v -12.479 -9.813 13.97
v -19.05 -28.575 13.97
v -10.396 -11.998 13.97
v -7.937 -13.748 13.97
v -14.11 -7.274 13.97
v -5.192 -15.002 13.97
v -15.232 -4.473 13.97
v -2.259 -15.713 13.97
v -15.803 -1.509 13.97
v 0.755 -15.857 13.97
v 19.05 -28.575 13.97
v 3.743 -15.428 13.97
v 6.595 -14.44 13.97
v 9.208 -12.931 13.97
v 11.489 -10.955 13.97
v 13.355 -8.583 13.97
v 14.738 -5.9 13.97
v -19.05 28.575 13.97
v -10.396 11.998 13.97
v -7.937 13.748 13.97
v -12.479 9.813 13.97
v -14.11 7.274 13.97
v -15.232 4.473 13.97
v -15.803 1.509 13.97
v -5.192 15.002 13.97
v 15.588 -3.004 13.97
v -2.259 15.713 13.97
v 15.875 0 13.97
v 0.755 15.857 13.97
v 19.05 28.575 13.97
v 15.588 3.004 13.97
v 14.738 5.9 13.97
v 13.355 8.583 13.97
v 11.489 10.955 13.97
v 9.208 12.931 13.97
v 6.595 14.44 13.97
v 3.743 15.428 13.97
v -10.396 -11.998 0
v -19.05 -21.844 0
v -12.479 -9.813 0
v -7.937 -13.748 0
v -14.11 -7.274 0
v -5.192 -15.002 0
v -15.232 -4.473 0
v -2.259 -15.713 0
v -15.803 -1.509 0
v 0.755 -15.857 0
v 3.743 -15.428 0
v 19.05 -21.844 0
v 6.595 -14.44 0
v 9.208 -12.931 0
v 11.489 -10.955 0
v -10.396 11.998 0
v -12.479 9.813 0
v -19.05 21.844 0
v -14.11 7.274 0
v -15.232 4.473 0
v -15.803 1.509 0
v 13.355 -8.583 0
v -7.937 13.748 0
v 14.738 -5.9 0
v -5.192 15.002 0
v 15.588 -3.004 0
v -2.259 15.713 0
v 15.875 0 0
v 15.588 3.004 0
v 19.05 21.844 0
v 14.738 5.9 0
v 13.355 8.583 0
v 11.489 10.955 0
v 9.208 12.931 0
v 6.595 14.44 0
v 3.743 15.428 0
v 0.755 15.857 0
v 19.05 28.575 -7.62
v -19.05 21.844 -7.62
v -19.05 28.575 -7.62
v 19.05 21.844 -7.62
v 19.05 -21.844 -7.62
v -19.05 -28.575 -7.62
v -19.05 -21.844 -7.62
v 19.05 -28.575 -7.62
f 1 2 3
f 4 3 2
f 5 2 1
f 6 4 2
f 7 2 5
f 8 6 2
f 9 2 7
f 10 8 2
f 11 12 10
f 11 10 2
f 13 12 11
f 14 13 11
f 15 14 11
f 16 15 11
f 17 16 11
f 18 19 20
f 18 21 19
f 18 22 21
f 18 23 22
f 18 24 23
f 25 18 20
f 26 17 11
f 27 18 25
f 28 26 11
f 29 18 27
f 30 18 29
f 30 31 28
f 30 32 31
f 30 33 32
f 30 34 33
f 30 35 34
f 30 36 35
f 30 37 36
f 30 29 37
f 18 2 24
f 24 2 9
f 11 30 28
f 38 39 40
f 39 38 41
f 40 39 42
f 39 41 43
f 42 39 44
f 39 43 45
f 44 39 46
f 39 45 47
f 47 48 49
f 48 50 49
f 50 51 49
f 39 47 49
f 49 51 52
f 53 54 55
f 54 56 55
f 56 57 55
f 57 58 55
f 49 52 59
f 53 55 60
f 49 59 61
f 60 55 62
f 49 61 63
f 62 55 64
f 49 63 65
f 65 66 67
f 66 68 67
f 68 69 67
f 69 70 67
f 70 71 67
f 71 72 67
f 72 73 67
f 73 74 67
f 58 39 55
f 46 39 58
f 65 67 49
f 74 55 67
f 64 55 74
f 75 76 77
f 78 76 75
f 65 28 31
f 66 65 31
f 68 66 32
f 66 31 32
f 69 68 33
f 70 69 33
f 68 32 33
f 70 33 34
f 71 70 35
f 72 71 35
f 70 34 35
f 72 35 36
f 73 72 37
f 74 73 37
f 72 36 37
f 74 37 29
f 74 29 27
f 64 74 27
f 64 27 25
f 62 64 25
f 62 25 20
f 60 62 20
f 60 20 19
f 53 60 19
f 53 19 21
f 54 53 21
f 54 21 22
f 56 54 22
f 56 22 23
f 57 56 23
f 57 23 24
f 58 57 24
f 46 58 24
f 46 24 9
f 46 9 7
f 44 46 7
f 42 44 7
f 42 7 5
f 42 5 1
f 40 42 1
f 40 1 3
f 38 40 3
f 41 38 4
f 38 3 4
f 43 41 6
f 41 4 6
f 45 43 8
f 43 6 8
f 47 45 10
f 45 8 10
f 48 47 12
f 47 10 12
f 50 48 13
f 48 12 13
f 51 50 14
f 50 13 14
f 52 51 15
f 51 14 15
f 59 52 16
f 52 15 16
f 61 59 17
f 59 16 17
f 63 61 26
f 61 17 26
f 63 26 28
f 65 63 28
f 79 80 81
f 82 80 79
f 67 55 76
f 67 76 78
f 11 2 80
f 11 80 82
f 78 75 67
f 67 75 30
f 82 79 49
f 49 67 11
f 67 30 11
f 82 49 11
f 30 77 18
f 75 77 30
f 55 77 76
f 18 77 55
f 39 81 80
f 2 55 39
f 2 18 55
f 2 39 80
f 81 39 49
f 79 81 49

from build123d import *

# Parameters (mm, degrees)
F0_W     = 38.1
F0_H     = 57.15
F1_DEPTH = 13.97
F2_R     = 15.875
F3_DEPTH = 25.4
F4_W     = 38.1
F4_H     = 6.731
F5_DEPTH = 7.62


with BuildPart() as f1:
    # F0 (on Top) → F1 (new body)
    with BuildSketch(Plane.XY):
        Rectangle(F0_W, F0_H)
    extrude(amount=F1_DEPTH)

    # F2 (on face) → F3 (cut)
    with BuildSketch(Plane.XY.offset(13.97)):
        Circle(F2_R)
    extrude(amount=-F3_DEPTH, mode=Mode.SUBTRACT)

    # F4 (on face) → F5 (join)
    with BuildSketch(Plane(origin=(0, 0, 0), x_dir=(1, 0, 0), z_dir=(0, 0, -1))):
        with Locations((0, 25.2095)):
            Rectangle(F4_W, F4_H)
        with Locations((0, -25.2095)):
            Rectangle(F4_W, F4_H)
    extrude(amount=F5_DEPTH)


solid = f1.part
